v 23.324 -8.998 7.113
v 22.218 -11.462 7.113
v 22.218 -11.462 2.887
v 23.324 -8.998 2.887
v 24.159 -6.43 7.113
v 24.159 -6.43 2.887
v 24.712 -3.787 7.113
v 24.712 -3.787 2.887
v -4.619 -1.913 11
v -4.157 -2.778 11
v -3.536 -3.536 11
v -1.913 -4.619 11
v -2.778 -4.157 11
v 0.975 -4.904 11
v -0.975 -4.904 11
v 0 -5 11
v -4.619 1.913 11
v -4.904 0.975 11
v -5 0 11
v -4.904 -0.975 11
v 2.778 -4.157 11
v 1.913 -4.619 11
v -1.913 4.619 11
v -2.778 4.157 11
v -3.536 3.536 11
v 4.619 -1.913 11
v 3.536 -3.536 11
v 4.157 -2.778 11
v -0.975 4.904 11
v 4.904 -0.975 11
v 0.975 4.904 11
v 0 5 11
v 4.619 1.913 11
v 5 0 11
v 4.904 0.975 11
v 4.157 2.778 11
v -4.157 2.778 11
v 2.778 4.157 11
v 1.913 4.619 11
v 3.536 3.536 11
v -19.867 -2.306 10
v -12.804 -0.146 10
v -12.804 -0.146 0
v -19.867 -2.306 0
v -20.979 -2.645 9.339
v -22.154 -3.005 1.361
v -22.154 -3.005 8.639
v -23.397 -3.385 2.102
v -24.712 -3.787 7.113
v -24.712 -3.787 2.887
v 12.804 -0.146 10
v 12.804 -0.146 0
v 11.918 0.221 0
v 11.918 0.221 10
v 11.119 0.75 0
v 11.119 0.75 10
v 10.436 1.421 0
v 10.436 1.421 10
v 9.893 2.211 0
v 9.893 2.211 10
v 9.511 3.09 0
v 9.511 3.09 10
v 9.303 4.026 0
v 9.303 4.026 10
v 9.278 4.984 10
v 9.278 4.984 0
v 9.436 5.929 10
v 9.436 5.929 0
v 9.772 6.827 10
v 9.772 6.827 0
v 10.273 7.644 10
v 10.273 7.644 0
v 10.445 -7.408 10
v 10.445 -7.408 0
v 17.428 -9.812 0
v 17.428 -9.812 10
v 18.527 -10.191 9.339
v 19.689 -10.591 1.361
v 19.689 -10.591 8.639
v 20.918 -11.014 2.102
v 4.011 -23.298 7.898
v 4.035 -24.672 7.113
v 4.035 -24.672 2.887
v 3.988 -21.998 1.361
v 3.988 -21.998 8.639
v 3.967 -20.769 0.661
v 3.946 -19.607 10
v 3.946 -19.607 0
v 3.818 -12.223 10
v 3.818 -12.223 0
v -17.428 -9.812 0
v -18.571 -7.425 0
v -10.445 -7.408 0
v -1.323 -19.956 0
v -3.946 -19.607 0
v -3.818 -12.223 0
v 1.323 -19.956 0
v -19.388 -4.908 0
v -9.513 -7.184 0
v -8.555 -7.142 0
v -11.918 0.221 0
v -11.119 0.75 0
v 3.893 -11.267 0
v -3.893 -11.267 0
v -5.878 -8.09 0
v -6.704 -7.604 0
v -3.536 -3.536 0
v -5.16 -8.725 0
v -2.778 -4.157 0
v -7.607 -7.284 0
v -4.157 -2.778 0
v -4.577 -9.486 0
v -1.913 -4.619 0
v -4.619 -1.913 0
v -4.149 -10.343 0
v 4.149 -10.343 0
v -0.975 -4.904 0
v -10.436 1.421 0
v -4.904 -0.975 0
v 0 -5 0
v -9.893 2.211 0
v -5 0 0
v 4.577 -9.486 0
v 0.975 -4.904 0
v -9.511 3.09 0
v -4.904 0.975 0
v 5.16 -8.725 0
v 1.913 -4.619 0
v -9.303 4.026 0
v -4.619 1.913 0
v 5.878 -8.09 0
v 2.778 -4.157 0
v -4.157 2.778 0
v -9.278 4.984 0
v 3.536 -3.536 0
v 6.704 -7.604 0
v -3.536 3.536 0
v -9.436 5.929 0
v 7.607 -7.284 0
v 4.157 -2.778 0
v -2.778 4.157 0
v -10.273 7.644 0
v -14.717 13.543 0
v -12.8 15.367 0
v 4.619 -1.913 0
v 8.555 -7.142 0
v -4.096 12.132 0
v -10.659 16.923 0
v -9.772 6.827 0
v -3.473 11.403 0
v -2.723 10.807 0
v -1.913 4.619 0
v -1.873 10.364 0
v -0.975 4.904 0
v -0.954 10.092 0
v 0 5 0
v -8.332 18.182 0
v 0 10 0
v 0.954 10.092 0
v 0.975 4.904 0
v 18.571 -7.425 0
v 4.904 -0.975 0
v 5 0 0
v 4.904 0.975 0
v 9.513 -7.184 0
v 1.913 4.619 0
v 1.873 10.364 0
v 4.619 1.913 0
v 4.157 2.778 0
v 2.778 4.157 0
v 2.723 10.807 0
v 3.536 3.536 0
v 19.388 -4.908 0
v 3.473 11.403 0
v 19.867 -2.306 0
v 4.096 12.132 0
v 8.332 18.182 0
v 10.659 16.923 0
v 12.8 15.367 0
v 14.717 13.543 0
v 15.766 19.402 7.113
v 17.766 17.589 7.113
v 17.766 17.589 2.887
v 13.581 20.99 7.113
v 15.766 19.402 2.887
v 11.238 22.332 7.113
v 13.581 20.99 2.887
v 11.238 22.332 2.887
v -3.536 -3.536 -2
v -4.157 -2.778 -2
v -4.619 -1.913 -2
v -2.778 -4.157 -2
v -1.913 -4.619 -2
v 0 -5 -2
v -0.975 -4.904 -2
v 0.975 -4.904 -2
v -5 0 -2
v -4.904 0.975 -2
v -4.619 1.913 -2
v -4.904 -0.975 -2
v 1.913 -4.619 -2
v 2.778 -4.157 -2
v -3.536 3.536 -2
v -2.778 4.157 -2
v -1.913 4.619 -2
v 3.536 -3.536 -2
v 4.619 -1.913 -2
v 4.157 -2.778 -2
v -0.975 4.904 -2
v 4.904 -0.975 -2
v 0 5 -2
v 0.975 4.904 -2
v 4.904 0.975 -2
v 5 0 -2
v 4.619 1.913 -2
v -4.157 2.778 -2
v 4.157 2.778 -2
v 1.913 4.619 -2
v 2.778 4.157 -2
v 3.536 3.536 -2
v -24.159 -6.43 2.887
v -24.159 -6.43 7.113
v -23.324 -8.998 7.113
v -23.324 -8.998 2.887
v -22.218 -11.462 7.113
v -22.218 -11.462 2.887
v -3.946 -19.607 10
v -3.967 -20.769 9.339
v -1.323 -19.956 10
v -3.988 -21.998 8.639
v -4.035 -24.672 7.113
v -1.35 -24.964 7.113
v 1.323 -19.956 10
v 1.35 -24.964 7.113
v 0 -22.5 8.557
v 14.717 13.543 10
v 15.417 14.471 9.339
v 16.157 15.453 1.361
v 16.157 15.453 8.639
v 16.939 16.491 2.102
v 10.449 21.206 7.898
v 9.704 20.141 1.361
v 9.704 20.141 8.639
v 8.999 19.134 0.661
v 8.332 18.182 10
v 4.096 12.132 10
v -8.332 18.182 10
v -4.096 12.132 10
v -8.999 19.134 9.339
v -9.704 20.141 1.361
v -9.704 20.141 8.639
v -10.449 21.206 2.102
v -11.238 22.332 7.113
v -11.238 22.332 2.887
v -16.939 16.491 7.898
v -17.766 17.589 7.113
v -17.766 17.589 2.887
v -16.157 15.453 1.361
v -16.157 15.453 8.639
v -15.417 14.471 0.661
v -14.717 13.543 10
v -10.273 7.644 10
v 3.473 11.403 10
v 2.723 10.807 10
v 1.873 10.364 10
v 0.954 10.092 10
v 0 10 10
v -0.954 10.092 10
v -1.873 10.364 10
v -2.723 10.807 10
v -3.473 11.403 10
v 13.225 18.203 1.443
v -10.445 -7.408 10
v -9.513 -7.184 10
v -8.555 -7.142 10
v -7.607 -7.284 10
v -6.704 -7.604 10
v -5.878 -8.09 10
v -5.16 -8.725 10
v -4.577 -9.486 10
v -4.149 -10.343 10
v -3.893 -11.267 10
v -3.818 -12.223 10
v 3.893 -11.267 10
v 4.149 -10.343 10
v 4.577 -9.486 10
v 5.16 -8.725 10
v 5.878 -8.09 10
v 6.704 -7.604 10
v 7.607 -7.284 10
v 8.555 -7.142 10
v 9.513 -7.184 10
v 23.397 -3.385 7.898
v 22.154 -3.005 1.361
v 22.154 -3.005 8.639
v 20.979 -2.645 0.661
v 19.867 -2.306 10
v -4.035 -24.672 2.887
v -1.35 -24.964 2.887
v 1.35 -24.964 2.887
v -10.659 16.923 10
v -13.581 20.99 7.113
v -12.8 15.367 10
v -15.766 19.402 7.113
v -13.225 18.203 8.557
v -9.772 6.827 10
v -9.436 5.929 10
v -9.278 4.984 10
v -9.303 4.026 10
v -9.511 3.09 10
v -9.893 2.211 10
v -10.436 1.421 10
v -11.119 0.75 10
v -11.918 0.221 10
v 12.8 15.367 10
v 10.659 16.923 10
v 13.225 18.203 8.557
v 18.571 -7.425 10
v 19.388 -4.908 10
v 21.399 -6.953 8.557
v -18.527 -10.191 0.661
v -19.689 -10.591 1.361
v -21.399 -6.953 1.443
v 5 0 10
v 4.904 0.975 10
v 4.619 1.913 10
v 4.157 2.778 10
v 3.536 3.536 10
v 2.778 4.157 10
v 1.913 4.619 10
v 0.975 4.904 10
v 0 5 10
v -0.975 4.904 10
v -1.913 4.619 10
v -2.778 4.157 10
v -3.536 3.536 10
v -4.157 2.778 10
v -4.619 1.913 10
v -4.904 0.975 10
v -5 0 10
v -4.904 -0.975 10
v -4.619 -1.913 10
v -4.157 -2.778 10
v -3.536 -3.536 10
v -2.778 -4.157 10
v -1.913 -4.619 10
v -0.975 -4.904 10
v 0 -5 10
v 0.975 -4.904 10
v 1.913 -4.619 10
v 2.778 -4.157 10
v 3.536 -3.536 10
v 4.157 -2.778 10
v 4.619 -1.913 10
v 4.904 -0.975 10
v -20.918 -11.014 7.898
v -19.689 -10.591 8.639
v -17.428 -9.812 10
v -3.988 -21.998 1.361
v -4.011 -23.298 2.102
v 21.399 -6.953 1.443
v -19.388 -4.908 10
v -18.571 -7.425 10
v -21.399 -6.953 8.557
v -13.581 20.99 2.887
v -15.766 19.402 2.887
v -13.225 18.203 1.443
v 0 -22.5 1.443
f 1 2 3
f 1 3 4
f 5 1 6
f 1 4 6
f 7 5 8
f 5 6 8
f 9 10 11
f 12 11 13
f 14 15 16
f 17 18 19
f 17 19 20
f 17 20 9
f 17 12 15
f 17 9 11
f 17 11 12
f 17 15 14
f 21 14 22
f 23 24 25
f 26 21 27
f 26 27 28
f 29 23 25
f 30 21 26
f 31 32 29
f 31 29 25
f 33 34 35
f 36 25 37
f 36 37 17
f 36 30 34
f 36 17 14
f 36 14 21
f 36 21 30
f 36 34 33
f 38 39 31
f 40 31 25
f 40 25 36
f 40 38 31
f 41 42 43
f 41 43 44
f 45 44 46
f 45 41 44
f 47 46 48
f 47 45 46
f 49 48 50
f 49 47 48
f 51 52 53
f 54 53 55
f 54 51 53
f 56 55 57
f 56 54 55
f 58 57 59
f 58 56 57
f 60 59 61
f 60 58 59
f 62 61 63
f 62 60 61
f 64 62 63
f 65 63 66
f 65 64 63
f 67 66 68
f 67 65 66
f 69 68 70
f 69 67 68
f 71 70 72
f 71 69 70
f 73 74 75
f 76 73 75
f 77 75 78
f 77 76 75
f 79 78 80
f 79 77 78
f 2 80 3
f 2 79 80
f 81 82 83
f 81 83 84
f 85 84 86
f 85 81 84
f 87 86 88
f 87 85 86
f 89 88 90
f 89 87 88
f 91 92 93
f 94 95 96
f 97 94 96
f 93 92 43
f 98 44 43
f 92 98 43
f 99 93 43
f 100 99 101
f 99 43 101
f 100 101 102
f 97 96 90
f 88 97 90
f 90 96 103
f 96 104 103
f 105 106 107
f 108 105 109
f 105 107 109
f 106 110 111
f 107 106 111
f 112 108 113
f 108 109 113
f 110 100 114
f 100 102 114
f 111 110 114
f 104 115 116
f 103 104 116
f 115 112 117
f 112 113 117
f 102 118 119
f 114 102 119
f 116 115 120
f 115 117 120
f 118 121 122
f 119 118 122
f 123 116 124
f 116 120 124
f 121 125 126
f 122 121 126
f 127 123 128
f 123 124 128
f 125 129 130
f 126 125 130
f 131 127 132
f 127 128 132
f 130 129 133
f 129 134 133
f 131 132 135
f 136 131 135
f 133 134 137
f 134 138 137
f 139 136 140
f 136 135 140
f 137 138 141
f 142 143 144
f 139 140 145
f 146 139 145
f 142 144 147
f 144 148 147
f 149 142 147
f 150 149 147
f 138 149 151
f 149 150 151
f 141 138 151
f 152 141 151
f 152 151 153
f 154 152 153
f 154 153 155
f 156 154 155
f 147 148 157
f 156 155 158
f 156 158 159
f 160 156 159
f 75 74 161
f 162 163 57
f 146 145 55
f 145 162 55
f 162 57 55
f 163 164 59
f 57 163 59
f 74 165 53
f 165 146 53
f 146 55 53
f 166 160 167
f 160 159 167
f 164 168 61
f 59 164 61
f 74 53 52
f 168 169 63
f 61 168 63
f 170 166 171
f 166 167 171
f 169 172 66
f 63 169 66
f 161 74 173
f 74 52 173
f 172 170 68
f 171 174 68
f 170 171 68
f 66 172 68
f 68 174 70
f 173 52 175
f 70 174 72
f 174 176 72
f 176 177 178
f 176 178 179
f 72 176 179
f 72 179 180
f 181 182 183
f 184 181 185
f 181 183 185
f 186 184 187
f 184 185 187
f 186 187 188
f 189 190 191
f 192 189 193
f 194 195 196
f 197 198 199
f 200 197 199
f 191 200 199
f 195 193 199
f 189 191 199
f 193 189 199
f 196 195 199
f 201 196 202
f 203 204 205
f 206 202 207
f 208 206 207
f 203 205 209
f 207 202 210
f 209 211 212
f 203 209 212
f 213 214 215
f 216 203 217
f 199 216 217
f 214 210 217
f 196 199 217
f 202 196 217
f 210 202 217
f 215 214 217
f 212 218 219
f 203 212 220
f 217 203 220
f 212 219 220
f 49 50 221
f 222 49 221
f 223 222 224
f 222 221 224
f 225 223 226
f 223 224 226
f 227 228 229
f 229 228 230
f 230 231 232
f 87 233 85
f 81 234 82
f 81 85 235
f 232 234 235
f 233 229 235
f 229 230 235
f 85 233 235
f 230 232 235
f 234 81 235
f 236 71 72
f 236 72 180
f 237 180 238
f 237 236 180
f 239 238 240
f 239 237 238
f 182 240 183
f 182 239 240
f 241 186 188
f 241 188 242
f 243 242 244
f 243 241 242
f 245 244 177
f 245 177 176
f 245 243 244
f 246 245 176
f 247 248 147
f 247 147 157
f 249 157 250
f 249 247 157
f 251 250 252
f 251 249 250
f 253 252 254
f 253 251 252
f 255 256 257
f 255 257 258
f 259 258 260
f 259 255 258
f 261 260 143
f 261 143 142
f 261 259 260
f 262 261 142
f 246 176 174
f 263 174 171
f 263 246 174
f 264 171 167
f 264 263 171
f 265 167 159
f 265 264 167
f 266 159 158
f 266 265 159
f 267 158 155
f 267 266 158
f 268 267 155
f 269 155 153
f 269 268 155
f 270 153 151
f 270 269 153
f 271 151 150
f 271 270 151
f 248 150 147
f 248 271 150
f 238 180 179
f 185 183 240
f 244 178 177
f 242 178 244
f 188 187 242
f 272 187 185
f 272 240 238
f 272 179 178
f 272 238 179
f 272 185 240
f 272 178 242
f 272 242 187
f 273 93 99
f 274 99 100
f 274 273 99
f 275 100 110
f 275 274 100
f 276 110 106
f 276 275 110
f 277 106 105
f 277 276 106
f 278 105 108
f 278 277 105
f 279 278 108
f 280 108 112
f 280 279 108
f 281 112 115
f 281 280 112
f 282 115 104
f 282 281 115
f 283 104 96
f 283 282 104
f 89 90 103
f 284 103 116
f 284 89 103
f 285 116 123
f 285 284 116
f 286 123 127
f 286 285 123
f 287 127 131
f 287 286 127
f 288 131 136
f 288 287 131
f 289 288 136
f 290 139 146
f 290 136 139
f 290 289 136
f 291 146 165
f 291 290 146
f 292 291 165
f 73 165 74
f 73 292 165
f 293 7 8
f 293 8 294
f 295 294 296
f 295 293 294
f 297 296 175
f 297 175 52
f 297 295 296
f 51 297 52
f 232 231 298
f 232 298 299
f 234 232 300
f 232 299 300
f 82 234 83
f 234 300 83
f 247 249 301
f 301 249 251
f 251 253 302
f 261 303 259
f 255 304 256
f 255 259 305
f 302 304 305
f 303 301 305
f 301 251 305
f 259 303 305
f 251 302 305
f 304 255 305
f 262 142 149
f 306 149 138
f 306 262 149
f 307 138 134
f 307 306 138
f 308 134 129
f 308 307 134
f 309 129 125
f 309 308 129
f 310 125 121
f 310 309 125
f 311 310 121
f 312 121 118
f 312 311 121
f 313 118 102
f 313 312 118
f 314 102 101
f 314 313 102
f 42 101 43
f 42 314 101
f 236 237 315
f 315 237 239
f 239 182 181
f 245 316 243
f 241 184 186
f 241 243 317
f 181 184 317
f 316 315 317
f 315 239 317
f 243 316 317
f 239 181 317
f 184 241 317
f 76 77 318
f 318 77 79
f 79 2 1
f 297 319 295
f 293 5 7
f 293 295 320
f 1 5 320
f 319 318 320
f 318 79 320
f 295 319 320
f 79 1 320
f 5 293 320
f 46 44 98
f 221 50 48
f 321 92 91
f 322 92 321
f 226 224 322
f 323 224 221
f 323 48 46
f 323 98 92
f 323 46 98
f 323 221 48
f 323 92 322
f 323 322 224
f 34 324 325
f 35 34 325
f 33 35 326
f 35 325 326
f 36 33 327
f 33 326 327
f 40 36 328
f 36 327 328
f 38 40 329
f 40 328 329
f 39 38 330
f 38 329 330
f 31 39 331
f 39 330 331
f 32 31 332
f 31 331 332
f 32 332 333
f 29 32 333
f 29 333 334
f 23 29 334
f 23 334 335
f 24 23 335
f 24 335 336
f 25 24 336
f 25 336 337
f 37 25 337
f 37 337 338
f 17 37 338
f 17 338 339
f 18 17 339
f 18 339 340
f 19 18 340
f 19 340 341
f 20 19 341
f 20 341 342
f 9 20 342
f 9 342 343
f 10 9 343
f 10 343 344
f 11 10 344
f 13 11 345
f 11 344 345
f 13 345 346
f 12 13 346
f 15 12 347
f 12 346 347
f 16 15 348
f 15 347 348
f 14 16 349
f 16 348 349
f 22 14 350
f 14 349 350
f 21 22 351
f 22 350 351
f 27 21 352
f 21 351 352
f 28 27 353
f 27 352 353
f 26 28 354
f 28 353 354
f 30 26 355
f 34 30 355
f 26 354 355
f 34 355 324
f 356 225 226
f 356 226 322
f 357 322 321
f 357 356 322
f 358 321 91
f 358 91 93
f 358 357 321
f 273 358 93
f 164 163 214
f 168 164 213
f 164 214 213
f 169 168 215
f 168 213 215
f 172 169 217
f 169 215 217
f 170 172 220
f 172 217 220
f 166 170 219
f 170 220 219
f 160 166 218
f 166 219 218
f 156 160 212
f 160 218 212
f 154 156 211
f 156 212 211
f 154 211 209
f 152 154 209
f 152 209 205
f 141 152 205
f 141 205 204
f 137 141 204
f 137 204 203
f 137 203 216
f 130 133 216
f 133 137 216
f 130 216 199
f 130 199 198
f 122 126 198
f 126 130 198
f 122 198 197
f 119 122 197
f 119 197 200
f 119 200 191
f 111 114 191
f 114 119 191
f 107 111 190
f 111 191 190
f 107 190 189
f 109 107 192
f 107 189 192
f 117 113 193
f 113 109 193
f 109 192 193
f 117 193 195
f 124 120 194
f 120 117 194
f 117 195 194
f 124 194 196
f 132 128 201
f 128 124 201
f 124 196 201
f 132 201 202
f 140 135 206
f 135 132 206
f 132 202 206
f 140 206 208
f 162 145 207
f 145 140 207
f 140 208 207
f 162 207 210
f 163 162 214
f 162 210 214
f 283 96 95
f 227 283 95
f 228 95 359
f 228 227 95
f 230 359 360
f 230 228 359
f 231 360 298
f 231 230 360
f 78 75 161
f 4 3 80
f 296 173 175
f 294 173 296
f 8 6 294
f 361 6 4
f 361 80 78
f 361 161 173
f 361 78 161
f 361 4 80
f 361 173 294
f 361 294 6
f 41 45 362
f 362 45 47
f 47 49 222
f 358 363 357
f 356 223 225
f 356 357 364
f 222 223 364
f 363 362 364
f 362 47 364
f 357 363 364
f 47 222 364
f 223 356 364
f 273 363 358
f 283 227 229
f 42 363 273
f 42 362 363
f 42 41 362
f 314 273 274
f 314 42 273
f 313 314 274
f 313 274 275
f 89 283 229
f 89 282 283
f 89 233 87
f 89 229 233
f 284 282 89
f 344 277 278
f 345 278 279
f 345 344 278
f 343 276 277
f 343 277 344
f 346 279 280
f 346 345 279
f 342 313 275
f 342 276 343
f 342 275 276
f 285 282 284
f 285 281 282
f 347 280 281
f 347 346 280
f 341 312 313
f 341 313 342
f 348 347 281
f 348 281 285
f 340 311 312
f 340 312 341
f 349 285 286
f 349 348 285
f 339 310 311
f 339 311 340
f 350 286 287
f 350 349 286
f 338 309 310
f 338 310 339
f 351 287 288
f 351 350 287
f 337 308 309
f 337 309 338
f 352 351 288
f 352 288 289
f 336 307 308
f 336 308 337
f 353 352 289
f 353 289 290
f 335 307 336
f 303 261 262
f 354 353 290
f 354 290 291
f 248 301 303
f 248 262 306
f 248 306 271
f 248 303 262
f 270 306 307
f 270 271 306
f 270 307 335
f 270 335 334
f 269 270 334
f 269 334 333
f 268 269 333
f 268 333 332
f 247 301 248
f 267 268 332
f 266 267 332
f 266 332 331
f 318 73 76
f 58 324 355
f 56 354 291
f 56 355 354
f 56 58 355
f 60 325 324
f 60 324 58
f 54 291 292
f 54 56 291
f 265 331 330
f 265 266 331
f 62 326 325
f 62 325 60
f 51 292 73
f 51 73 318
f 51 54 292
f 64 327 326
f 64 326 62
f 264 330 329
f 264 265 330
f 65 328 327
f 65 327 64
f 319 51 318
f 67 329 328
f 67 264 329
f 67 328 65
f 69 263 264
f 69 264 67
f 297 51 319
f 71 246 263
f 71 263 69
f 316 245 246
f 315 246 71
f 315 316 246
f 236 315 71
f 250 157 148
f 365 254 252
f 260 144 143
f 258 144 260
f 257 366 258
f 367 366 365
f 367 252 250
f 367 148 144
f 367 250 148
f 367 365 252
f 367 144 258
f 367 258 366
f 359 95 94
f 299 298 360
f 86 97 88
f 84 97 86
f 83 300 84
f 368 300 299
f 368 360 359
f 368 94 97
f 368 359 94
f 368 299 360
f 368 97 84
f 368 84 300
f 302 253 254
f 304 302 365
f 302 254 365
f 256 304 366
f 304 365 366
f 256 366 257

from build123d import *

# Parameters (mm, degrees)
SKETCH1_R                = 25
BOSS_EXTRUDE1_DEPTH      = 10
CHAMFER1_SIZE            = 5
CHAMFER1_SIZE2           = 2.886751346
CHAMFER2_SIZE            = 5
CHAMFER2_SIZE2           = 2.886751346
CUT_EXTRUDE1_DEPTH       = 37.742346142
CIRPATTERN1_COUNT        = 5
BOSS_EXTRUDE2_DEPTH      = 1
BOSS_EXTRUDE2_DEPTH_BACK = 12
SKETCH3_R                = 5


with BuildPart() as part:
    # Sketch1 → Boss-Extrude1 (new body)
    with BuildSketch(Plane.XY):
        Circle(SKETCH1_R)
    extrude(amount=BOSS_EXTRUDE1_DEPTH)

    # Chamfer1
    chamfer1_edges = [part.edges().sort_by_distance(p)[0] for p in [
        (-25, 0, 10),
    ]]
    chamfer1_side = [part.faces().sort_by_distance(p)[0] for p in [
        (0, 0, 10),
    ]]
    chamfer(chamfer1_edges, length=CHAMFER1_SIZE, length2=CHAMFER1_SIZE2, reference=chamfer1_side[0])

    # Chamfer2
    chamfer2_edges = [part.edges().sort_by_distance(p)[0] for p in [
        (-25, 0, 0),
    ]]
    chamfer2_side = [part.faces().sort_by_distance(p)[0] for p in [
        (0, 0, 0),
    ]]
    chamfer(chamfer2_edges, length=CHAMFER2_SIZE, length2=CHAMFER2_SIZE2, reference=chamfer2_side[0])

    # Sketch2 → Cut-Extrude1 (cut, through all)
    with BuildSketch(Plane.XY.offset(10)):
        with BuildLine():
            Line((11.23772214, 22.331896496), (4.095760221, 12.132117818))
            ThreePointArc((4.095760221, 12.132117818), (0, 10), (-4.095760221, 12.132117818))
            Line((-4.095760221, 12.132117818), (-11.23772214, 22.331896496))
            ThreePointArc((-11.23772214, 22.331896496), (0, 25), (11.23772214, 22.331896496))
        make_face()
    cut_extrude1 = extrude(amount=-CUT_EXTRUDE1_DEPTH, mode=Mode.SUBTRACT)

    # CirPattern1: Cut-Extrude1 ×5 about axis
    cirpattern1_axis = Axis((0, 0, 0), (0, 0, 1))
    for i in range(1, CIRPATTERN1_COUNT):
        add(cut_extrude1.rotate(cirpattern1_axis, i * 360 / CIRPATTERN1_COUNT), mode=Mode.SUBTRACT)

    # Sketch3 → Boss-Extrude2 (add, two sides: drawn at the far end of the back side and taken through both)
    with BuildSketch(Plane.XY.offset(10).offset(-BOSS_EXTRUDE2_DEPTH_BACK)):
        Circle(SKETCH3_R)
    extrude(amount=BOSS_EXTRUDE2_DEPTH + BOSS_EXTRUDE2_DEPTH_BACK)


solid = part.part
